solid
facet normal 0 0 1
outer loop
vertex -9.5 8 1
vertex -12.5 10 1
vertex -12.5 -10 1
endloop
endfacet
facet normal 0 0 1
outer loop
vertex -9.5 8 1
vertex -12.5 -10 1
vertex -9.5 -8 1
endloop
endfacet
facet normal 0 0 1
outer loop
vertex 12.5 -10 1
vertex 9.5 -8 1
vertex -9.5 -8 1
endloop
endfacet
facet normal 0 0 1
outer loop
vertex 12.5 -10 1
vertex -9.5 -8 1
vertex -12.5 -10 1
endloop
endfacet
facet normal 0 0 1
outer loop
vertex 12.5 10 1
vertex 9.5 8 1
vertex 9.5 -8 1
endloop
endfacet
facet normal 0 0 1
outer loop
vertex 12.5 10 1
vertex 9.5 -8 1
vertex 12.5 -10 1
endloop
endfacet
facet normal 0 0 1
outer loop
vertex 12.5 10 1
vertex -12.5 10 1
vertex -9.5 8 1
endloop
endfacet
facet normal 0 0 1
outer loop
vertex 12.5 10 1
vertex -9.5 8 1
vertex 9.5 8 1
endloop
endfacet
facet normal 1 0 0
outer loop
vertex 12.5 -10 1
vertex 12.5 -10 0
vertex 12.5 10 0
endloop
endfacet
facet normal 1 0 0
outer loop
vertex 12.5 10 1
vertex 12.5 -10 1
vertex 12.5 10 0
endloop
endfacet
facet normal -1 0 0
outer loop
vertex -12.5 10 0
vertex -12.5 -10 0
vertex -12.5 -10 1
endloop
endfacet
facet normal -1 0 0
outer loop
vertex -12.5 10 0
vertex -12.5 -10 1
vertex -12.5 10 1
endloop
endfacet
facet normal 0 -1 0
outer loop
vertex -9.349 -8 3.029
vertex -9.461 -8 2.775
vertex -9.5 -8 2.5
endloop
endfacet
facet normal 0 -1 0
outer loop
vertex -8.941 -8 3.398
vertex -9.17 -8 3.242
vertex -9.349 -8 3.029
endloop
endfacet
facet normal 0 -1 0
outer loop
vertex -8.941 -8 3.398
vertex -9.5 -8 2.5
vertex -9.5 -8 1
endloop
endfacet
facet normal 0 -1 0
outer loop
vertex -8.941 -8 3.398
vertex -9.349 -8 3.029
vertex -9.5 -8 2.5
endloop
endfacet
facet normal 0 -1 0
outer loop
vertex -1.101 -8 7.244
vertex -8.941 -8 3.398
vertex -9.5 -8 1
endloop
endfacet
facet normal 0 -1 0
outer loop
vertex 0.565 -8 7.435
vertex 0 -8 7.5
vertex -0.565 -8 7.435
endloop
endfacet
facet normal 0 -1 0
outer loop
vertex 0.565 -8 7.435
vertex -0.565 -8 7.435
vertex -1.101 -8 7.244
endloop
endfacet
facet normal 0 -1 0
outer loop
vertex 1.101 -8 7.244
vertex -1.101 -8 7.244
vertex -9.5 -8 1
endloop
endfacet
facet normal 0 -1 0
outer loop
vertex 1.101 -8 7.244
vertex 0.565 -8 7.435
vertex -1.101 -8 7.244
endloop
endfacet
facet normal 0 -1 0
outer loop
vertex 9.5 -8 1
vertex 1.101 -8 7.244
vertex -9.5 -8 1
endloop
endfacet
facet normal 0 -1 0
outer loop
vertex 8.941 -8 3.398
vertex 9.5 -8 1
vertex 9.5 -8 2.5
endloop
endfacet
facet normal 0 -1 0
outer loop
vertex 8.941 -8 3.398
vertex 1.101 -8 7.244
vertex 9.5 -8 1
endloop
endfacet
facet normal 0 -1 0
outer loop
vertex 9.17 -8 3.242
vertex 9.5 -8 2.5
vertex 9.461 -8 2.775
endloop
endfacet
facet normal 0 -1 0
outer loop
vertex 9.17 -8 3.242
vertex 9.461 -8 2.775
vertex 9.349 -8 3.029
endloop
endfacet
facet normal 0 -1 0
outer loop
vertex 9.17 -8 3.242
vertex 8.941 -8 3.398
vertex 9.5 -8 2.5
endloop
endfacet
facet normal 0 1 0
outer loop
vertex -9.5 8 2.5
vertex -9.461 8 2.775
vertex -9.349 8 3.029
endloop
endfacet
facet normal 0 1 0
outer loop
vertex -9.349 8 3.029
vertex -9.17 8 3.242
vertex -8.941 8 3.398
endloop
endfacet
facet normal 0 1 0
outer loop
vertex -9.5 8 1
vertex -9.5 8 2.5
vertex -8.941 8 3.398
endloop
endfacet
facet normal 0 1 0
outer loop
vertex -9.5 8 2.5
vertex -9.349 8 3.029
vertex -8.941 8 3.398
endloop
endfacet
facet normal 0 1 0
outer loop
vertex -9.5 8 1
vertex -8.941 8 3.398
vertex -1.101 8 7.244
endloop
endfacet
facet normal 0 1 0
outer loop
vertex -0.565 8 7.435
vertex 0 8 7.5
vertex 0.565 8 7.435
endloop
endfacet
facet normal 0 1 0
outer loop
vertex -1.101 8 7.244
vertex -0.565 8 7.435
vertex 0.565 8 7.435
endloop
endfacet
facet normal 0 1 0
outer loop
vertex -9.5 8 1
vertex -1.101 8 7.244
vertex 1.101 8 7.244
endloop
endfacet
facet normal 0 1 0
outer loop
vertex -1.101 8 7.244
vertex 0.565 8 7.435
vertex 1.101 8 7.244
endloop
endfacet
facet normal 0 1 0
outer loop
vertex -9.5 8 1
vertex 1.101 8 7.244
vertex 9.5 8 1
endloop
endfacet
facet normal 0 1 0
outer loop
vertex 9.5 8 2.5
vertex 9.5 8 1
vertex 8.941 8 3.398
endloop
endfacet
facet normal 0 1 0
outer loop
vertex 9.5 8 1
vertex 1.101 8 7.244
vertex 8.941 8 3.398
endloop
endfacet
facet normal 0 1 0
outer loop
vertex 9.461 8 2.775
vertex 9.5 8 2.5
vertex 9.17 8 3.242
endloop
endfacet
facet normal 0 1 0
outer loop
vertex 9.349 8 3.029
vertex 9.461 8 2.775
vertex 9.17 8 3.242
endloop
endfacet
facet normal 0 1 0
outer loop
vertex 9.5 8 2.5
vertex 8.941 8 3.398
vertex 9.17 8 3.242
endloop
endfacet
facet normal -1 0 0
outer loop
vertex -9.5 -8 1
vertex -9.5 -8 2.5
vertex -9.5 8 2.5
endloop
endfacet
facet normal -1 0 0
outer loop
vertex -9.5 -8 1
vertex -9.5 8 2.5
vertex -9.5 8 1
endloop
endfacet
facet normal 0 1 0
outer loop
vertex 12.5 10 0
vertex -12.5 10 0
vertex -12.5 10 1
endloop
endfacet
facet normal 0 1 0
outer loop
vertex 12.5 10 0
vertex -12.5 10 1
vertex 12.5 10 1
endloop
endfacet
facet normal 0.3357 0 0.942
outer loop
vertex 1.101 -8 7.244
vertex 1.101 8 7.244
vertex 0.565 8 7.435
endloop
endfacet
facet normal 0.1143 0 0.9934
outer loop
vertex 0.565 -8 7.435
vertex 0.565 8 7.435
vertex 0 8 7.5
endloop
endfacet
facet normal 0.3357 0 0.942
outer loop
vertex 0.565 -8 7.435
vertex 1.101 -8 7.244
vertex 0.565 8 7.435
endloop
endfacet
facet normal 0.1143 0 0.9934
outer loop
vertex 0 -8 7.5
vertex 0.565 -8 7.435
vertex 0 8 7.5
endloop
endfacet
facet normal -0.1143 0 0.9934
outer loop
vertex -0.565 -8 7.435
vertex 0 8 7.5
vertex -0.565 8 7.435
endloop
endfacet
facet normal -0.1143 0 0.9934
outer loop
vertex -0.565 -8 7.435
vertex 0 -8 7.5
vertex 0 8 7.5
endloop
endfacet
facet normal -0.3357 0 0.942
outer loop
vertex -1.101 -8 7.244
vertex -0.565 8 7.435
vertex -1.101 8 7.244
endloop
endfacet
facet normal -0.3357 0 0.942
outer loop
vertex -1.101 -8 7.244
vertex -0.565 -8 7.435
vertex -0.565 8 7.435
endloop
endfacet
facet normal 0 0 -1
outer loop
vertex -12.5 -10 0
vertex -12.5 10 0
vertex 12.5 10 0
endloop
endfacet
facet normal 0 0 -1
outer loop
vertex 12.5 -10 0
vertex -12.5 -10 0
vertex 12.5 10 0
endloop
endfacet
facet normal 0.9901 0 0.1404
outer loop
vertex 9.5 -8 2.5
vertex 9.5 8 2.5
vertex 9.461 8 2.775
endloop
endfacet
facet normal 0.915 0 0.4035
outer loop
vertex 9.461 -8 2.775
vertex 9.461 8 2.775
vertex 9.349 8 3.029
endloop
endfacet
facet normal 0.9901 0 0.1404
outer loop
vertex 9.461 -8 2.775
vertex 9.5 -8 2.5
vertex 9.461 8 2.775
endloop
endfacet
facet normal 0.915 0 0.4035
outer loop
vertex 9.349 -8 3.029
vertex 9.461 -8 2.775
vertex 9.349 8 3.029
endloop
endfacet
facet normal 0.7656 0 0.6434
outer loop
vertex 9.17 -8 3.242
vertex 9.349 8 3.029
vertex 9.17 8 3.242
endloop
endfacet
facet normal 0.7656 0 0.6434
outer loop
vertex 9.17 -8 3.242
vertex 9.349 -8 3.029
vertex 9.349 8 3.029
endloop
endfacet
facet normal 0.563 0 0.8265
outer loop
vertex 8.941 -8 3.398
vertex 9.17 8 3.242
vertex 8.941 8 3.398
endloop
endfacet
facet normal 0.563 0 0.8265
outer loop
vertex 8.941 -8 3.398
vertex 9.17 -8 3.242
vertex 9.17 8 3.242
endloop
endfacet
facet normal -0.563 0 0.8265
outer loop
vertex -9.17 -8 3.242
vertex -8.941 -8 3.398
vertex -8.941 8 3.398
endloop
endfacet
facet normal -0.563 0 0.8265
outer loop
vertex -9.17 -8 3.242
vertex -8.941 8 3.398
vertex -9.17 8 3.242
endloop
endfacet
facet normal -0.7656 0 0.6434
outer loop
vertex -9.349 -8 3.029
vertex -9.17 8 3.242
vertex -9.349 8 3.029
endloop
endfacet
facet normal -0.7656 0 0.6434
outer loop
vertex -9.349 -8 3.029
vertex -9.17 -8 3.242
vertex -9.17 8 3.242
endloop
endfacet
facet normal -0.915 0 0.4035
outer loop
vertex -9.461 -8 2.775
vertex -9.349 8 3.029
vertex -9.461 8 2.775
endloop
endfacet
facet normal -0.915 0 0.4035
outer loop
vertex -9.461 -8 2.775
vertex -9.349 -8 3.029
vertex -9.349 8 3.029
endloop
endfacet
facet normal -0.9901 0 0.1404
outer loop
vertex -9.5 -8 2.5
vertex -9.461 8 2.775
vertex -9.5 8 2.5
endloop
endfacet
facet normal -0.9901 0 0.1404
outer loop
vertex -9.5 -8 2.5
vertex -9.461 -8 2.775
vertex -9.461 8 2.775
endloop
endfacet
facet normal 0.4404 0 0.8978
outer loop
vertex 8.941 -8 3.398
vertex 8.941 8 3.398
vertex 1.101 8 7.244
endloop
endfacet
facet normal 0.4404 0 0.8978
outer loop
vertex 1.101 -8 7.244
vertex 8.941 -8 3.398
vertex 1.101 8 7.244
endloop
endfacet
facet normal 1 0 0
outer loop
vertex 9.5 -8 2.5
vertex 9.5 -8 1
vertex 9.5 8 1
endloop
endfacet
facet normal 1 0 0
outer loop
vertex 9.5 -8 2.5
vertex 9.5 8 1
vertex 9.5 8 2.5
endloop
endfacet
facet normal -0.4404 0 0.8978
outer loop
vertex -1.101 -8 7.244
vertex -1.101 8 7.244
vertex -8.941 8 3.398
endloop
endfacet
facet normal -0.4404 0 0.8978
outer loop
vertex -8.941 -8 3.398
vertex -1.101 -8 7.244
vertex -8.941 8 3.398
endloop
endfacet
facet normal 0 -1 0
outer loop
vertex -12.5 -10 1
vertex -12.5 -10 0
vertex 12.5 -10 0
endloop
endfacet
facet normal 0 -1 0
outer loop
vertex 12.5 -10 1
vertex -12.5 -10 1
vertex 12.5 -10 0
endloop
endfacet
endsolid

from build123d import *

# Parameters (mm, degrees)
F0_W     = 25
F0_H     = 20
F1_DEPTH = 1
F3_DEPTH = 8


with BuildPart() as f1:
    # F0 (on Top) → F1 (new body)
    with BuildSketch(Plane.XY):
        Rectangle(F0_W, F0_H)
    extrude(amount=F1_DEPTH)

    # F2 (on Front) → F3 (join, symmetric)
    with BuildSketch(Plane.XZ):
        with BuildLine():
            Line((8.940514, 3.397746), (1.101284, 7.244365))
            ThreePointArc((1.101284, 7.244365), (0, 7.5), (-1.101284, 7.244365))
            Line((-1.101284, 7.244365), (-8.940514, 3.397746))
            ThreePointArc((-8.940514, 3.397746), (-9.348679, 3.028908), (-9.5, 2.5))
            Line((-9.5, 2.5), (-9.5, 0.999067))
            Line((-9.5, 0.999067), (9.5, 0.999067))
            Line((9.5, 0.999067), (9.5, 2.5))
            ThreePointArc((9.5, 2.5), (9.348679, 3.028908), (8.940514, 3.397746))
        make_face()
    extrude(amount=F3_DEPTH, both=True)


solid = f1.part
